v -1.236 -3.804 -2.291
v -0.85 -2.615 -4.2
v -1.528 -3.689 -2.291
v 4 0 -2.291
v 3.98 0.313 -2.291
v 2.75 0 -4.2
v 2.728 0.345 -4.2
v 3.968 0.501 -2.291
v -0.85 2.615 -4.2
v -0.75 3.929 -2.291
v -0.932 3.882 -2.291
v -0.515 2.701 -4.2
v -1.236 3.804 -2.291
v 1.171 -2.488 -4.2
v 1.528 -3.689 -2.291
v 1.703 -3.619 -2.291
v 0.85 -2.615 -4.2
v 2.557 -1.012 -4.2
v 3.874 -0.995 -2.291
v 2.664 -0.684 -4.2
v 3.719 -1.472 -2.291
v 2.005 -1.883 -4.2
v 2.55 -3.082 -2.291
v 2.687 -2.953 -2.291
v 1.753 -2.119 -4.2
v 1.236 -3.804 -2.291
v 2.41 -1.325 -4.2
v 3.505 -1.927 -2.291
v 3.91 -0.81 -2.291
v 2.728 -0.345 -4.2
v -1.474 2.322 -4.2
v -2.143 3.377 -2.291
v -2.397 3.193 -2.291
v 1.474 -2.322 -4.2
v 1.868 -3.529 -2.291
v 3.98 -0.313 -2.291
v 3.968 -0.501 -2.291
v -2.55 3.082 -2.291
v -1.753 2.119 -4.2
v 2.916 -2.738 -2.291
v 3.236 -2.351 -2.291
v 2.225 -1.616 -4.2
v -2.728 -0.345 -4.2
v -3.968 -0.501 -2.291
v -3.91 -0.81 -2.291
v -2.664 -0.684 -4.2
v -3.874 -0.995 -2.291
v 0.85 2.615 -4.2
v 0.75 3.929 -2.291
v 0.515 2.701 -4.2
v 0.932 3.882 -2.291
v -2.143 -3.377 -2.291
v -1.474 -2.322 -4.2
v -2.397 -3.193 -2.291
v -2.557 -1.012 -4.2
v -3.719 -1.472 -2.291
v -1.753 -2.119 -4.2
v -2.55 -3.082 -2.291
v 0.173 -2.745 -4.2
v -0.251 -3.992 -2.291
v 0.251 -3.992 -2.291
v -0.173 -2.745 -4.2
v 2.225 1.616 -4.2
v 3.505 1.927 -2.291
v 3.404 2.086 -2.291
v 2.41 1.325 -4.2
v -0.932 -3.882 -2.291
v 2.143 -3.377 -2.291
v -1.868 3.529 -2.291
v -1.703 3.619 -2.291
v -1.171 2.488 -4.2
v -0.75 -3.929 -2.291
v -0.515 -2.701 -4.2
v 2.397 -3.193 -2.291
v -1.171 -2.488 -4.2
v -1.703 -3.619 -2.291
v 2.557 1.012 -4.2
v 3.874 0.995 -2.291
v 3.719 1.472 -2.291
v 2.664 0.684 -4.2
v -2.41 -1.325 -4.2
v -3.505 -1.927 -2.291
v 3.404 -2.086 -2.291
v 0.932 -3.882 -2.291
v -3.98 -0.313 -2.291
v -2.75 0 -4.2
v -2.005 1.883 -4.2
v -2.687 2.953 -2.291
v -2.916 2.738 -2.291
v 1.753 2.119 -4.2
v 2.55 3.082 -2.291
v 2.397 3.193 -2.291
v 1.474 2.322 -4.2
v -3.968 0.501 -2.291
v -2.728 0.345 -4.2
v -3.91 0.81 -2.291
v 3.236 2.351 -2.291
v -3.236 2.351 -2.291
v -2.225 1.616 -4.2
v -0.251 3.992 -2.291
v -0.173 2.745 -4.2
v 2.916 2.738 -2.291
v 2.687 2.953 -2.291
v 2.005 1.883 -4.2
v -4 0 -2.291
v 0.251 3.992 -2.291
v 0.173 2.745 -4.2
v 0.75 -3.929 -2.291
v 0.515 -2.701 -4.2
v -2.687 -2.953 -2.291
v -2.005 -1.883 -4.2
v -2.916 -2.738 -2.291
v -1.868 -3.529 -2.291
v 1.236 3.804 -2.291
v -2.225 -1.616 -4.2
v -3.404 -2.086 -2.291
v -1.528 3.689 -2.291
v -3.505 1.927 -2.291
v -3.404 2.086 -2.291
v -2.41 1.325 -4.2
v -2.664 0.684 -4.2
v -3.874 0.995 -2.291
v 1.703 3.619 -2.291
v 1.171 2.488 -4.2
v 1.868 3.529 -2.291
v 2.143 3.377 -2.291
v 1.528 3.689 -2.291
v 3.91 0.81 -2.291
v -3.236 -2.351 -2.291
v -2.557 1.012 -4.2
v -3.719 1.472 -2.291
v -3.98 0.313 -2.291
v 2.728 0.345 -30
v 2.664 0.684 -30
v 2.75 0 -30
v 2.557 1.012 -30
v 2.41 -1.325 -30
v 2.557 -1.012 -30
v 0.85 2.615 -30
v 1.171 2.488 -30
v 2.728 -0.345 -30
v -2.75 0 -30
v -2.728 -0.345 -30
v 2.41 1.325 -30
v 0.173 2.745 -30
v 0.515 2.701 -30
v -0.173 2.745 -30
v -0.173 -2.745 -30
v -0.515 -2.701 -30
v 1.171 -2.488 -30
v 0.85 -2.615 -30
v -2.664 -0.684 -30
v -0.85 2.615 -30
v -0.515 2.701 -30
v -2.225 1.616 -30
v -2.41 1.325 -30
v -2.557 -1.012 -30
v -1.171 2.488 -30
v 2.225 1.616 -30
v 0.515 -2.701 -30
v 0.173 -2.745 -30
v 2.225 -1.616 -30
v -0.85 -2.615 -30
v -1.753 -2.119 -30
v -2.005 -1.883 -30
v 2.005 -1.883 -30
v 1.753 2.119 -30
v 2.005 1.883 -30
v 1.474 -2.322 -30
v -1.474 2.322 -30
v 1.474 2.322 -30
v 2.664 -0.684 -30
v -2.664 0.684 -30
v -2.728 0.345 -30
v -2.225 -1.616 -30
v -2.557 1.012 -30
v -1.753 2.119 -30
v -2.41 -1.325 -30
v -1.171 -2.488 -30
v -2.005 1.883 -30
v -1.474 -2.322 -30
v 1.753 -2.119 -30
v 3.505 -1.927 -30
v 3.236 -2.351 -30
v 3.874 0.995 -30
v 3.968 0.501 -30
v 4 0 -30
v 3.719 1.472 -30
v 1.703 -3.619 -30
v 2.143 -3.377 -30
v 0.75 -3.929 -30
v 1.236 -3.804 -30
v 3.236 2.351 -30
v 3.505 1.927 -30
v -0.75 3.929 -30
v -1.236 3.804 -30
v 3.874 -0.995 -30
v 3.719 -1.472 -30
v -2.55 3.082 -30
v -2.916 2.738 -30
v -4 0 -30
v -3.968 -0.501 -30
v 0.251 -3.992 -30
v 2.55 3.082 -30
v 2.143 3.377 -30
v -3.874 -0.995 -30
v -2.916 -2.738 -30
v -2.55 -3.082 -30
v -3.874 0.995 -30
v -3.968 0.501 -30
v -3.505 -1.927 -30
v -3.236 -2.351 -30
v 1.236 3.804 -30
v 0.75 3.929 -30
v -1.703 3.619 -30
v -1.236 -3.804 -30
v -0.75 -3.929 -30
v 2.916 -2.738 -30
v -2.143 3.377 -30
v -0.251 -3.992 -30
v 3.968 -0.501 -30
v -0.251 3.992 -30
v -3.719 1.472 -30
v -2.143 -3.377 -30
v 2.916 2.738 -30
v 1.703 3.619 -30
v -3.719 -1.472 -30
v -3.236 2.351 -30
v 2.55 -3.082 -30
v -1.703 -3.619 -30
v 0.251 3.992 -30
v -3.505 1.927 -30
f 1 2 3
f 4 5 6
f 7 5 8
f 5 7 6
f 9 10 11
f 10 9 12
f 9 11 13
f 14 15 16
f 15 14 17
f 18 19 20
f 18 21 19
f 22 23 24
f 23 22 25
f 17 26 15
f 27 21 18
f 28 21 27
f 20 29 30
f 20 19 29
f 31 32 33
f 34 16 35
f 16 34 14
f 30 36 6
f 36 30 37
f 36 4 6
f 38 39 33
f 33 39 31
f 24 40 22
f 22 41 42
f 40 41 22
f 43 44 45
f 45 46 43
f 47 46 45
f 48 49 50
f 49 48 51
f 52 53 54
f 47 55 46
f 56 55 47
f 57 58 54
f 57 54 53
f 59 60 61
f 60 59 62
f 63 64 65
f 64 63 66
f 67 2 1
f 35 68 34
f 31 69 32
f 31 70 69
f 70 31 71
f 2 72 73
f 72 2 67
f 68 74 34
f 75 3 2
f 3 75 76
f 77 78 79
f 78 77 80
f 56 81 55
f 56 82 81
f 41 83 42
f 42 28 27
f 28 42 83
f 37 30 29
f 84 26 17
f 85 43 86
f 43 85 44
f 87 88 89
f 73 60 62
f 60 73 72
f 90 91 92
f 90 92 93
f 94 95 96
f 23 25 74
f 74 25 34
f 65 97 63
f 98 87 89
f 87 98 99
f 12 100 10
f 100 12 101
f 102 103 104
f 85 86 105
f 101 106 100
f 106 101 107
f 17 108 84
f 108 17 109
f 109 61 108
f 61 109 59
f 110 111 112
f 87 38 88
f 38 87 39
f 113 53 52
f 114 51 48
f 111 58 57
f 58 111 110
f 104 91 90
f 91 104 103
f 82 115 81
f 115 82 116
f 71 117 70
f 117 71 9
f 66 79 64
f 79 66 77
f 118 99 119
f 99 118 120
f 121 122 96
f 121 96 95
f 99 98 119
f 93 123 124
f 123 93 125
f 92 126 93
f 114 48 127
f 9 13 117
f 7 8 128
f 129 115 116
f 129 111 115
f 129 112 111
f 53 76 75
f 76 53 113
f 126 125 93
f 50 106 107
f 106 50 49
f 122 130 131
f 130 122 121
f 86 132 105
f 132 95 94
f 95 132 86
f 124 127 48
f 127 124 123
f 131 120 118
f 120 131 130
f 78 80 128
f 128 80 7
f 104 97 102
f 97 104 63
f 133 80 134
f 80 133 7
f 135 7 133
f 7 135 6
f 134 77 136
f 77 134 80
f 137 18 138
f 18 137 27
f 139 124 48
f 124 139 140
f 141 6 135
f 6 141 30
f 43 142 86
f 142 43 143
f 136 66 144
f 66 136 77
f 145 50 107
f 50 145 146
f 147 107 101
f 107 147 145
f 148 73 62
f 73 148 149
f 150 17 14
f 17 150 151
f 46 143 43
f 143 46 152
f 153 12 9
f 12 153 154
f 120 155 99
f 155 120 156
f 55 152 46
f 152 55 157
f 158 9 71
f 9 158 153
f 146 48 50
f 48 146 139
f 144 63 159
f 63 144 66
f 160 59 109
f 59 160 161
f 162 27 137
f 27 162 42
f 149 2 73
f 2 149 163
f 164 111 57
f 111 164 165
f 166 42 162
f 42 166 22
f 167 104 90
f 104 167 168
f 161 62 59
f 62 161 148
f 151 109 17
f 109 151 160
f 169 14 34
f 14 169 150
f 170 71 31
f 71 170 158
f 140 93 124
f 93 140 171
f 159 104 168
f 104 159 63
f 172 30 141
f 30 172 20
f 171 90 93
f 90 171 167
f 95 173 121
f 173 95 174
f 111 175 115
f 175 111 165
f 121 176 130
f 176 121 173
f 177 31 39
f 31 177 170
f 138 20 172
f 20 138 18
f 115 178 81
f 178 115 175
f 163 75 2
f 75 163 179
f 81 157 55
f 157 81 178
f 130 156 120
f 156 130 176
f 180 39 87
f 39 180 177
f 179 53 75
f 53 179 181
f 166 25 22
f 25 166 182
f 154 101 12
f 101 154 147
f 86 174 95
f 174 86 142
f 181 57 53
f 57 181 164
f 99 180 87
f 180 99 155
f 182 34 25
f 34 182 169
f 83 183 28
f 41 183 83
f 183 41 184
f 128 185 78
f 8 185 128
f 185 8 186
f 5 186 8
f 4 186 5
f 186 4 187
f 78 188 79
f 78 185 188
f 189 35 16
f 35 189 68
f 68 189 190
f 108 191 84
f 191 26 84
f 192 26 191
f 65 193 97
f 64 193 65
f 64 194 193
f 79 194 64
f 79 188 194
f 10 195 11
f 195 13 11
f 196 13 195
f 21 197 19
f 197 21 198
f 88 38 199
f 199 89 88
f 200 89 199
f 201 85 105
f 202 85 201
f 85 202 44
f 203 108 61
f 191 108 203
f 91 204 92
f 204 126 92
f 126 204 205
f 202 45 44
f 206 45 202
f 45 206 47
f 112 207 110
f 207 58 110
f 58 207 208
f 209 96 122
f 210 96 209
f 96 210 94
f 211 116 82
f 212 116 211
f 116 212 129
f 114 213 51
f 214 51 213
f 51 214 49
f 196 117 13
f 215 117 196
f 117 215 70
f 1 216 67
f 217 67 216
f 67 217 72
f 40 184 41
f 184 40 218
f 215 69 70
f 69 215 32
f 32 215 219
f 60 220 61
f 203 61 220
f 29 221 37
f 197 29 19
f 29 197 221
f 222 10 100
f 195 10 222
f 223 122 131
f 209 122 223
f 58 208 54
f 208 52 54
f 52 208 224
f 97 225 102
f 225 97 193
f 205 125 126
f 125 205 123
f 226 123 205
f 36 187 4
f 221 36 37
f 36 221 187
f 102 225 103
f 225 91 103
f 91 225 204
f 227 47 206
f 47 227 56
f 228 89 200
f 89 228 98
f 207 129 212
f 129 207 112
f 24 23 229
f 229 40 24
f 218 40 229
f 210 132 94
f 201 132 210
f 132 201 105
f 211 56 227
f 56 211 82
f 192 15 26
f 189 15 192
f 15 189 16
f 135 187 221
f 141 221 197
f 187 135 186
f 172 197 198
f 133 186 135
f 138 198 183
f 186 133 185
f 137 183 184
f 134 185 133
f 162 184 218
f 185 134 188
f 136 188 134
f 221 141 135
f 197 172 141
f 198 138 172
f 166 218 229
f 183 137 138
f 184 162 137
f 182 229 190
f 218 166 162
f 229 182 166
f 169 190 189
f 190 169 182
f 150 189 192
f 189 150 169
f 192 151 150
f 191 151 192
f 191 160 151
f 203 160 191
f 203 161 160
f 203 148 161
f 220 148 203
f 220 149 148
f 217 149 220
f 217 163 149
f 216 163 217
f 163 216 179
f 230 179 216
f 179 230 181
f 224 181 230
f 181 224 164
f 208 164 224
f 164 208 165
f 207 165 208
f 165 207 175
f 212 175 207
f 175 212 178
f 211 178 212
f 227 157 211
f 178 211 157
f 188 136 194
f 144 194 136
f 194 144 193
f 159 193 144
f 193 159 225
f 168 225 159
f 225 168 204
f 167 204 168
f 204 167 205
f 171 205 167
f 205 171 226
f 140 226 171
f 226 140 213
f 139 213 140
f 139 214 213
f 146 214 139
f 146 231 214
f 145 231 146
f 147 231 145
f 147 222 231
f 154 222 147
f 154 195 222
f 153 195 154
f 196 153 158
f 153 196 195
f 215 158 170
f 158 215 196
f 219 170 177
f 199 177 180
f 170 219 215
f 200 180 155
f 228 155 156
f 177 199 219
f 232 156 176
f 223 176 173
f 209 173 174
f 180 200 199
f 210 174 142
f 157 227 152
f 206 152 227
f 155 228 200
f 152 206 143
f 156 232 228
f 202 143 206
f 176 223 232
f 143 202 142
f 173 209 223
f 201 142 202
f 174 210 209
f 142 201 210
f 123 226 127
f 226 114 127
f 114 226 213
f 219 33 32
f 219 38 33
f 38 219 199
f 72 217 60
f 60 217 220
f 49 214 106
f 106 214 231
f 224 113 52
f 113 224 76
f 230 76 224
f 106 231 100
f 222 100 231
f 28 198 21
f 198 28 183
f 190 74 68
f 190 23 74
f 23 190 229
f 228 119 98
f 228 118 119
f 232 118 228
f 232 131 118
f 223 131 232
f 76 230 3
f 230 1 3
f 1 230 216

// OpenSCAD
$fn = 50;

difference() {
	union() {
		translate(v = [0, 0, -30.0]) {
			cylinder(h = 33, r = 4.0);
		}
	}
	union() {
		translate(v = [0, 0, 0]) {
			rotate(a = [0, 0, 0]) {
				difference() {
					union() {
						translate(v = [0, 0, -33.0]) {
							cylinder(h = 33, r = 2.25);
						}
						translate(v = [0, 0, -4.2]) {
							cylinder(h = 4.2, r1 = 2.75, r2 = 5.5);
						}
						translate(v = [0, 0, -33.0]) {
							cylinder(h = 33, r = 2.75);
						}
						translate(v = [0, 0, -33.0]) {
							cylinder(h = 33, r = 2.25);
						}
					}
					union();
				}
			}
		}
		#cylinder(h = 3, r = 6.25);
	}
}
